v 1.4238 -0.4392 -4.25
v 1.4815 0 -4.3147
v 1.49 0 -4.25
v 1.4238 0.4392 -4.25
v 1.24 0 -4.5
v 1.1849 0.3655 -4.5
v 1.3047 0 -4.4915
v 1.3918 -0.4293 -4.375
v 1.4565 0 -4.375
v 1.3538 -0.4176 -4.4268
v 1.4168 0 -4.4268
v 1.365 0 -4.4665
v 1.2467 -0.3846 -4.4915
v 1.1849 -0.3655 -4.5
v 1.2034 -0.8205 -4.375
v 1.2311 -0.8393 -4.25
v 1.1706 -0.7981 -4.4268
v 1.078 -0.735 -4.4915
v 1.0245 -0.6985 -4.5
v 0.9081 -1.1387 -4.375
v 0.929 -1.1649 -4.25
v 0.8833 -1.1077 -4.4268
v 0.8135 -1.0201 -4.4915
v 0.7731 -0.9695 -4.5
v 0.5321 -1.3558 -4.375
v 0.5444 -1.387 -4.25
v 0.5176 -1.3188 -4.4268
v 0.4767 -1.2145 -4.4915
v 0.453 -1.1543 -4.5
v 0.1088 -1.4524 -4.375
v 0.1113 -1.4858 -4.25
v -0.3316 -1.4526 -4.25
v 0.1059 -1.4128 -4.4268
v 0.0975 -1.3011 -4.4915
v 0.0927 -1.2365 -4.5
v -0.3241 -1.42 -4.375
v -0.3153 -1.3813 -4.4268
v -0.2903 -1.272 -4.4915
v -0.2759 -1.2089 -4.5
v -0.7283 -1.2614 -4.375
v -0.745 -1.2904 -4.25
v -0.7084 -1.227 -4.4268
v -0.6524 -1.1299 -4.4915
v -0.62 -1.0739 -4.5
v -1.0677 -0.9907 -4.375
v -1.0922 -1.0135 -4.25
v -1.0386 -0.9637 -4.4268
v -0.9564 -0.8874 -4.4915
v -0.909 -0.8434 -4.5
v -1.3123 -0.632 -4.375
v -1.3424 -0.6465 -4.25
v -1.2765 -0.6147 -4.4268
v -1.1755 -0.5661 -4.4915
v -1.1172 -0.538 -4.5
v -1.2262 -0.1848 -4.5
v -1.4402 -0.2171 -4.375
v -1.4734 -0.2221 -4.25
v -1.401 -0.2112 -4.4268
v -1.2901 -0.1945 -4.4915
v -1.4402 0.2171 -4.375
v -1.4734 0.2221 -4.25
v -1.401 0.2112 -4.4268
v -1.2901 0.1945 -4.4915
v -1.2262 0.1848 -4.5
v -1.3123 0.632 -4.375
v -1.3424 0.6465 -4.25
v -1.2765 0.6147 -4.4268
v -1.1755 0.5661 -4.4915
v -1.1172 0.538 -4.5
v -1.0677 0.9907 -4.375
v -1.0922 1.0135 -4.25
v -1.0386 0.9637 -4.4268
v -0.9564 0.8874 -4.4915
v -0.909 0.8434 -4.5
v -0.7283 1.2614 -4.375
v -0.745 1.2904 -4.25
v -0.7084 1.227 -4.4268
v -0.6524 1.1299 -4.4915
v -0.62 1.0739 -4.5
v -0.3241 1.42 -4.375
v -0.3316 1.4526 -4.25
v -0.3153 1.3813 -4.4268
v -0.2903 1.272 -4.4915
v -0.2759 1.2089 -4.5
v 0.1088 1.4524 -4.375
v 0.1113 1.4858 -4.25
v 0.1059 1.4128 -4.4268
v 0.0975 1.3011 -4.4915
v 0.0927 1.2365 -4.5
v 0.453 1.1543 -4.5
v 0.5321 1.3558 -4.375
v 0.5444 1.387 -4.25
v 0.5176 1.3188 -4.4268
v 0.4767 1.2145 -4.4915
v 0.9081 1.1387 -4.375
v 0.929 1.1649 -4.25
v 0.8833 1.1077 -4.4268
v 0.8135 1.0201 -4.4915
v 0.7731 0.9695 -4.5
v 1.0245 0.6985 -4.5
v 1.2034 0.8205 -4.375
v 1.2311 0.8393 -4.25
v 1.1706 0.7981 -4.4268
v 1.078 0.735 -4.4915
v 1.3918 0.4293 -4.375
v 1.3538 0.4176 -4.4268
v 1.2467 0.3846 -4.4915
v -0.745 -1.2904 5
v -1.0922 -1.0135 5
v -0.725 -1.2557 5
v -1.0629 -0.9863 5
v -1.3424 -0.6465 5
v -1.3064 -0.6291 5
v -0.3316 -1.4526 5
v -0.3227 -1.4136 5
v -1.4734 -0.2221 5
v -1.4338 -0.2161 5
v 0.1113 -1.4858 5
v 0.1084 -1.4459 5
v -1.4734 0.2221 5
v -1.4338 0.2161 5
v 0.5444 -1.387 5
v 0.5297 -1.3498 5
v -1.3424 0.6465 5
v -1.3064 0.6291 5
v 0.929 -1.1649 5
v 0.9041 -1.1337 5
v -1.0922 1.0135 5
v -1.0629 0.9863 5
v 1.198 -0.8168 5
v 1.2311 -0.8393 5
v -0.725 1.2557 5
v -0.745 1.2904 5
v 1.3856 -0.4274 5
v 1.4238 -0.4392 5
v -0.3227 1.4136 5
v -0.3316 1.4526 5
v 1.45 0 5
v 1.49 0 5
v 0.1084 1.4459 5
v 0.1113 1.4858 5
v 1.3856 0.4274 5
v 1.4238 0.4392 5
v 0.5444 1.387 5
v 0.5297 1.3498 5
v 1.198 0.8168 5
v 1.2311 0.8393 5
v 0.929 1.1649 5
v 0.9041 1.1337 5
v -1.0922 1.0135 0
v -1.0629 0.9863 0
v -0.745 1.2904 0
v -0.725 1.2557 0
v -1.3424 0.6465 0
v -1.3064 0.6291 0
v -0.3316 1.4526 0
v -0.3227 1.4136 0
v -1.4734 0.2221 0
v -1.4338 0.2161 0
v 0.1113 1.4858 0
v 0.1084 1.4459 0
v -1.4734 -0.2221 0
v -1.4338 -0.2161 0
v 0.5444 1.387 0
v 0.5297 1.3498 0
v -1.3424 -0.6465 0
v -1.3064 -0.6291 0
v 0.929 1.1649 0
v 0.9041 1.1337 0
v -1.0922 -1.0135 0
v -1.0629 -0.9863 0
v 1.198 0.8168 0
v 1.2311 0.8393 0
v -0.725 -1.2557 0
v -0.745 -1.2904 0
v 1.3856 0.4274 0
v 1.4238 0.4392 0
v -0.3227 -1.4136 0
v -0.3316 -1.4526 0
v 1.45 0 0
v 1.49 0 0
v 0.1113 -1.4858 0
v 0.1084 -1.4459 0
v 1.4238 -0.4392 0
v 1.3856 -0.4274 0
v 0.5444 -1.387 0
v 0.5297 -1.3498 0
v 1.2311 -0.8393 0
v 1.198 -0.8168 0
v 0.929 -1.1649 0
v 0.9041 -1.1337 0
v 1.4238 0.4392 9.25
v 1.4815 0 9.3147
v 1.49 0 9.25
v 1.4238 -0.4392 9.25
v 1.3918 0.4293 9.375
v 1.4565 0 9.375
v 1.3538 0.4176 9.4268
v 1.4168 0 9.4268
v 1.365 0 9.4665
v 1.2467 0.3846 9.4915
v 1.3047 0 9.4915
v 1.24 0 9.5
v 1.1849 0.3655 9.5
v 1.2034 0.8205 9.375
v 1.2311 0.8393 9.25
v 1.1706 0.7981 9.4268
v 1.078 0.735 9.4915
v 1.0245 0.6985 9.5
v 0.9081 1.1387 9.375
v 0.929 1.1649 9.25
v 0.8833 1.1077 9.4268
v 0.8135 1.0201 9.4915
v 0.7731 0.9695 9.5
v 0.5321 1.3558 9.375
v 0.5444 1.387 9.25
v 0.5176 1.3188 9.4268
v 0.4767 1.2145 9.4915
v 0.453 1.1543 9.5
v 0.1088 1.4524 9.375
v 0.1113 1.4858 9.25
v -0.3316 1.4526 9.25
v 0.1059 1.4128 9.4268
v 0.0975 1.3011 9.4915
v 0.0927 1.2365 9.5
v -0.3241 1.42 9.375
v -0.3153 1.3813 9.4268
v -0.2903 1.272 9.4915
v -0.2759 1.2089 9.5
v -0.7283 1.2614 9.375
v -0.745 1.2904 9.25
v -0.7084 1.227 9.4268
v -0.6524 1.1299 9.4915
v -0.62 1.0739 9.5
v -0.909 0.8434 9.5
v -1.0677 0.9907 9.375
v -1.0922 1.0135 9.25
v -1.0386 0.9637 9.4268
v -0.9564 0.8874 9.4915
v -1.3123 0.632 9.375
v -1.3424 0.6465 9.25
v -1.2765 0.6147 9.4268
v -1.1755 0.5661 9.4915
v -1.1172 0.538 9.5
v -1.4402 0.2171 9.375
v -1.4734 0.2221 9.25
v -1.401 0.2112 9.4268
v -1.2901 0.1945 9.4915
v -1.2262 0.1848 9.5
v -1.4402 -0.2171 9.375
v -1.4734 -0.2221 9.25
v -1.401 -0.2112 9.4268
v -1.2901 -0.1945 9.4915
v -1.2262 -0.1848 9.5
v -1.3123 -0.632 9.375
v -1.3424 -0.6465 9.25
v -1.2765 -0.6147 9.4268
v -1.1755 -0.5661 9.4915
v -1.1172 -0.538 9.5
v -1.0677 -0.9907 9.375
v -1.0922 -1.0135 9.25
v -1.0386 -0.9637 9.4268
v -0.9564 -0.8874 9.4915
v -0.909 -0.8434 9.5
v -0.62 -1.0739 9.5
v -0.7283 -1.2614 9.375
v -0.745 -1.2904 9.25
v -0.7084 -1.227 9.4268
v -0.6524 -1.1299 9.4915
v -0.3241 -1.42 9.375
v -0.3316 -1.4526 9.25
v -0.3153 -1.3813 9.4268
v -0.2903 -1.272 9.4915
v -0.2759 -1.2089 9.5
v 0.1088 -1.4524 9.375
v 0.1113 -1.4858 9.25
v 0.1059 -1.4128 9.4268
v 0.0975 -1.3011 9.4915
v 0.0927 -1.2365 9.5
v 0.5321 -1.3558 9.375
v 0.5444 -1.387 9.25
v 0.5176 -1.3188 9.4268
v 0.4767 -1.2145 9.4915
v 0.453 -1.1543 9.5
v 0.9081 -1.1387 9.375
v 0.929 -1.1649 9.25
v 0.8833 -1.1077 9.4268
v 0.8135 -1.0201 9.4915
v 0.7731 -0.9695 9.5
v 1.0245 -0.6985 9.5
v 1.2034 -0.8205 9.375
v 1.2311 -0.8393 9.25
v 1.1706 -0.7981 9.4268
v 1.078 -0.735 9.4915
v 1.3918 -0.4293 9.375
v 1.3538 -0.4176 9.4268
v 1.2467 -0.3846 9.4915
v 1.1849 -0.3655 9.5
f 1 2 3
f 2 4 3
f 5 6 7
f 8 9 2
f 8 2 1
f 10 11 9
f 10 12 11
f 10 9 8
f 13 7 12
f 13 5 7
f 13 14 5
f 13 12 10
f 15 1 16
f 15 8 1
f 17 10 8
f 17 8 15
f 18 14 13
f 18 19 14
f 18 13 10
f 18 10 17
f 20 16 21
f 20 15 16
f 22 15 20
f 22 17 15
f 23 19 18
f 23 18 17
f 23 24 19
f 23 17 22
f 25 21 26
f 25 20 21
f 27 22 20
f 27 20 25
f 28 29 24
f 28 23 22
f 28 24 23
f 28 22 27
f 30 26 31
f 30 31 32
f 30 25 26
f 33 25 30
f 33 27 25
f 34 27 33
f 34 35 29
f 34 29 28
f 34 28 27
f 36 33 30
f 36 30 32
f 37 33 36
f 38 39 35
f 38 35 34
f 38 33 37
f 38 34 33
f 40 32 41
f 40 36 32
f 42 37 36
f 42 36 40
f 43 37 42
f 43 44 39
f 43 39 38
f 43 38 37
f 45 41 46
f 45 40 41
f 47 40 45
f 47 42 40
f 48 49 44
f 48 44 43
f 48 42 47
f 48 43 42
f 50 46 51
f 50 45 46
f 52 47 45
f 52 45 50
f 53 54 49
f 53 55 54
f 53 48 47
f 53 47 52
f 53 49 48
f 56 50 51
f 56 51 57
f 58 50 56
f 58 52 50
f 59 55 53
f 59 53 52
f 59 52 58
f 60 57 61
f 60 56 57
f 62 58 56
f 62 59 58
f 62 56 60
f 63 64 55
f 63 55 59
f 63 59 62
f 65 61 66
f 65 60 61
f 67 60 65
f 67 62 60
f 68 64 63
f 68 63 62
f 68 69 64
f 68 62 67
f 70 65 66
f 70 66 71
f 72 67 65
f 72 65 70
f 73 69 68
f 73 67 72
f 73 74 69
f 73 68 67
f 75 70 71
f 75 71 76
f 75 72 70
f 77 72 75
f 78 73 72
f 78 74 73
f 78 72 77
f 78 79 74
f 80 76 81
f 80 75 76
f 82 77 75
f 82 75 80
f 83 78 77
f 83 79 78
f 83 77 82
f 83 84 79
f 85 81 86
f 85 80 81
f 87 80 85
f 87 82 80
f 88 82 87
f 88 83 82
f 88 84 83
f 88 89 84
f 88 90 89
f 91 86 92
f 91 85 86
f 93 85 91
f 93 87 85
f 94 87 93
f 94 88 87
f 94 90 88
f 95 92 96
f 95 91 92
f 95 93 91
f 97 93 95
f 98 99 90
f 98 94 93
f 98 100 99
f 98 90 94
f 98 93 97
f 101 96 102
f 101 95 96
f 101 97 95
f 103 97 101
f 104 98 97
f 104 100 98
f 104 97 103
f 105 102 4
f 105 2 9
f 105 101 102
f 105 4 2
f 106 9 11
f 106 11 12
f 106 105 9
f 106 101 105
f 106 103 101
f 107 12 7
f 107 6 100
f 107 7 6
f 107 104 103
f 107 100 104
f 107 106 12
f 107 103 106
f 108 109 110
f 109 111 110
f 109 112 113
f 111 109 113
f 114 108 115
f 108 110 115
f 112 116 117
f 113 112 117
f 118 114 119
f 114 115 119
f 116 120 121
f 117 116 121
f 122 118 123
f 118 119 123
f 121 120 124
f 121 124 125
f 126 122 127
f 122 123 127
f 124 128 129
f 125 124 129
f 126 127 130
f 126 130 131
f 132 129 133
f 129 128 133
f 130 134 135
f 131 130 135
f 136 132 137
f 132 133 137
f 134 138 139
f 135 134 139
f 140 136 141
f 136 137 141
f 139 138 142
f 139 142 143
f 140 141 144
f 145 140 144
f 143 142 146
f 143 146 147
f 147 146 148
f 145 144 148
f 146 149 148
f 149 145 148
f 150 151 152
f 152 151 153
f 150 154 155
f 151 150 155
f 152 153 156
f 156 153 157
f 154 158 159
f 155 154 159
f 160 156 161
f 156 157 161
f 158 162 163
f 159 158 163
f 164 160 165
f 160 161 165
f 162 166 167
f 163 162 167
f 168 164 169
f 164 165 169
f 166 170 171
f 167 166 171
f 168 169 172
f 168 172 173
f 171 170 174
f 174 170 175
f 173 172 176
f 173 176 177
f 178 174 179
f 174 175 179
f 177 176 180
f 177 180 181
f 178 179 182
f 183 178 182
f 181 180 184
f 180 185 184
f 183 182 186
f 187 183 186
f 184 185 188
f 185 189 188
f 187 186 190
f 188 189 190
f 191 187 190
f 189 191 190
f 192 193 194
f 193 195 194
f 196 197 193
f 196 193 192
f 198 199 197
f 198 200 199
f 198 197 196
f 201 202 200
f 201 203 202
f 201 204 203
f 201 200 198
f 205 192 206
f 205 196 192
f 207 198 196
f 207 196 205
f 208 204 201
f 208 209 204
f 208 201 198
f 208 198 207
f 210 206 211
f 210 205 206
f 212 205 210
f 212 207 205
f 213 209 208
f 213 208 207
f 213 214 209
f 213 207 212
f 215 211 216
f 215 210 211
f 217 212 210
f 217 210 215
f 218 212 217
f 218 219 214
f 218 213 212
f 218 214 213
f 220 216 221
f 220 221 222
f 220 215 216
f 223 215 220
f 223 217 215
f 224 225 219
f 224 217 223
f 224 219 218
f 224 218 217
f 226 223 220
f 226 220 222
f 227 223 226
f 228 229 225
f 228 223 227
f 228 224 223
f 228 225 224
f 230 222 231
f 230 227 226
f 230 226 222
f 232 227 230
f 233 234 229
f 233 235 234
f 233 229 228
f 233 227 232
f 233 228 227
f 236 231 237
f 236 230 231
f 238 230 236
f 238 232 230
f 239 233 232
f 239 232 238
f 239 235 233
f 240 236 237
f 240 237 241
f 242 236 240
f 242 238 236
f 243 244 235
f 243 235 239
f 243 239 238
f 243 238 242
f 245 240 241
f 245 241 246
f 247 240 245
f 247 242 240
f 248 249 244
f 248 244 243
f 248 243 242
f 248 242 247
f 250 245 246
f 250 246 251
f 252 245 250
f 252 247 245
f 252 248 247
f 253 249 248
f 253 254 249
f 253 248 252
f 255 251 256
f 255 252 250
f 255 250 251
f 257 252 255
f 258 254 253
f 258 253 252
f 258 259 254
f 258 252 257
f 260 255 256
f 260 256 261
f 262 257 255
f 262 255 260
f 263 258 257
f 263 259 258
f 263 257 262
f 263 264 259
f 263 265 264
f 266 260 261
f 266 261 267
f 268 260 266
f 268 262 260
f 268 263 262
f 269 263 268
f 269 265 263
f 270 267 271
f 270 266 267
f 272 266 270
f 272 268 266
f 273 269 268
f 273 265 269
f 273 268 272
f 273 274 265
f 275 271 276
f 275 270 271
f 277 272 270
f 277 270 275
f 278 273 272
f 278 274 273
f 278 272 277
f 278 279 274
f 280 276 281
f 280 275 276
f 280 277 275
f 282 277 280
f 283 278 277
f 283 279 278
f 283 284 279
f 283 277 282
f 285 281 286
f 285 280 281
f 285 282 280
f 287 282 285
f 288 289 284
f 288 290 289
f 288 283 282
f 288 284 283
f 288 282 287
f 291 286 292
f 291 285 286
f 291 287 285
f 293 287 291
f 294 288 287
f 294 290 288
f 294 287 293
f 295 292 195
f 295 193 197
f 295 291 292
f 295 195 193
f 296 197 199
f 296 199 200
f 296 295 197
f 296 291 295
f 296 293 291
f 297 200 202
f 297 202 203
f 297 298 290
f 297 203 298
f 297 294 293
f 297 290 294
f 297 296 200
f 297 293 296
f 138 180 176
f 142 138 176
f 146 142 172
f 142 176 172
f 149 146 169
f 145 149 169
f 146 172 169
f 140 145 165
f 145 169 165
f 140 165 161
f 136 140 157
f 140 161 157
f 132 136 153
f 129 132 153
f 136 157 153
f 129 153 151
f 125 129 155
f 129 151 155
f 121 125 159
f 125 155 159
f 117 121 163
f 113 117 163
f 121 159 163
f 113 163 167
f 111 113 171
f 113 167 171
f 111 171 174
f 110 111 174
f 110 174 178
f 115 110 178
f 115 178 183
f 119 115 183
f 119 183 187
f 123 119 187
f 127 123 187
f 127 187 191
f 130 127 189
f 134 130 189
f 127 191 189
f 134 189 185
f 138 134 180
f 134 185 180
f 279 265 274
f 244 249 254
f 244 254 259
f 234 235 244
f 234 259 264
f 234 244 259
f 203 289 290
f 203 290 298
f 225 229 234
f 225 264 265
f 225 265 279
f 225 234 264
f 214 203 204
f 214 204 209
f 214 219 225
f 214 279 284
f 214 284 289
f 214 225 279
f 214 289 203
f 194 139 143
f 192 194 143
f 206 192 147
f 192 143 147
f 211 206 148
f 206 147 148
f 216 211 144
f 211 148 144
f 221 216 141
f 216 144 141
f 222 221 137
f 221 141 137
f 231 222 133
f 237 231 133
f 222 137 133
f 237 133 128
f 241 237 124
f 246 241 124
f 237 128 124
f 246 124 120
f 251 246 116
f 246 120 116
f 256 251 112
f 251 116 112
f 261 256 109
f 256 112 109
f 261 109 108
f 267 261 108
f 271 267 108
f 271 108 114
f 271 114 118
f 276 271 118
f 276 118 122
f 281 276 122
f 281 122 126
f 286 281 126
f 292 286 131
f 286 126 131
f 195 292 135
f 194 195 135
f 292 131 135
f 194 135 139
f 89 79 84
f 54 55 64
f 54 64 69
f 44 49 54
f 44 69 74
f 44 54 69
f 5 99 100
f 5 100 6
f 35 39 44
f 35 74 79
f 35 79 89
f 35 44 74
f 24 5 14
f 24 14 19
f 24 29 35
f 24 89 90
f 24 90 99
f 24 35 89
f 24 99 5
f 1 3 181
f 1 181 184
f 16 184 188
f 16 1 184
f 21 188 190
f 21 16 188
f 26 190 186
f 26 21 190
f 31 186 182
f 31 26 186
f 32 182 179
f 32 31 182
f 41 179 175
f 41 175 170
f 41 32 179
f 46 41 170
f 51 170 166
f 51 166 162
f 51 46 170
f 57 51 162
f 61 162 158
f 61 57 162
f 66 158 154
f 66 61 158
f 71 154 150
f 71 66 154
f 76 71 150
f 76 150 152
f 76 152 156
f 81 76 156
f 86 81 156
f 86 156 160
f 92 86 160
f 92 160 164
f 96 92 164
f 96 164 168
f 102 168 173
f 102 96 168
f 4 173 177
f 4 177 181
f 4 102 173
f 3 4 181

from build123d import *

# Parameters (mm, degrees)
SKETCH_1_R      = 1.45
EXTRUDE_1_DEPTH = 5
SKETCH_2_R      = 1.49
EXTRUDE_2_DEPTH = 4.5
EXTRUDE_START   = 4.5
SKETCH_5_R      = 1.49
EXTRUDE_3_DEPTH = 4.5
FILLET_1_R      = 0.25


with BuildPart() as part:
    # 스케치1 → 보스-돌출1 (new body)
    with BuildSketch(Plane.XY):
        Circle(SKETCH_1_R)
    extrude(amount=EXTRUDE_1_DEPTH)

    # 스케치2 → 보스-돌출2 (add)
    with BuildSketch(Plane.XY.offset(5)):
        Circle(SKETCH_2_R)
    extrude(amount=EXTRUDE_2_DEPTH)

    # 스케치5 → 보스-돌출3 (add)
    with BuildSketch(Plane(origin=(0, 0, 0), x_dir=(-1, 0, 0), z_dir=(0, 0, -1)).offset(EXTRUDE_START)):
        with Locations(Location((0, 0, 0), (0, 0, 180))):
            Circle(SKETCH_5_R)
    extrude(amount=-EXTRUDE_3_DEPTH)

    # 필렛1
    fillet_1_edges = [part.edges().sort_by_distance(p)[0] for p in [
        (-1.49, 0, -4.5),
        (-1.49, 0, 9.5),
    ]]
    fillet(fillet_1_edges, radius=FILLET_1_R)


solid = part.part
